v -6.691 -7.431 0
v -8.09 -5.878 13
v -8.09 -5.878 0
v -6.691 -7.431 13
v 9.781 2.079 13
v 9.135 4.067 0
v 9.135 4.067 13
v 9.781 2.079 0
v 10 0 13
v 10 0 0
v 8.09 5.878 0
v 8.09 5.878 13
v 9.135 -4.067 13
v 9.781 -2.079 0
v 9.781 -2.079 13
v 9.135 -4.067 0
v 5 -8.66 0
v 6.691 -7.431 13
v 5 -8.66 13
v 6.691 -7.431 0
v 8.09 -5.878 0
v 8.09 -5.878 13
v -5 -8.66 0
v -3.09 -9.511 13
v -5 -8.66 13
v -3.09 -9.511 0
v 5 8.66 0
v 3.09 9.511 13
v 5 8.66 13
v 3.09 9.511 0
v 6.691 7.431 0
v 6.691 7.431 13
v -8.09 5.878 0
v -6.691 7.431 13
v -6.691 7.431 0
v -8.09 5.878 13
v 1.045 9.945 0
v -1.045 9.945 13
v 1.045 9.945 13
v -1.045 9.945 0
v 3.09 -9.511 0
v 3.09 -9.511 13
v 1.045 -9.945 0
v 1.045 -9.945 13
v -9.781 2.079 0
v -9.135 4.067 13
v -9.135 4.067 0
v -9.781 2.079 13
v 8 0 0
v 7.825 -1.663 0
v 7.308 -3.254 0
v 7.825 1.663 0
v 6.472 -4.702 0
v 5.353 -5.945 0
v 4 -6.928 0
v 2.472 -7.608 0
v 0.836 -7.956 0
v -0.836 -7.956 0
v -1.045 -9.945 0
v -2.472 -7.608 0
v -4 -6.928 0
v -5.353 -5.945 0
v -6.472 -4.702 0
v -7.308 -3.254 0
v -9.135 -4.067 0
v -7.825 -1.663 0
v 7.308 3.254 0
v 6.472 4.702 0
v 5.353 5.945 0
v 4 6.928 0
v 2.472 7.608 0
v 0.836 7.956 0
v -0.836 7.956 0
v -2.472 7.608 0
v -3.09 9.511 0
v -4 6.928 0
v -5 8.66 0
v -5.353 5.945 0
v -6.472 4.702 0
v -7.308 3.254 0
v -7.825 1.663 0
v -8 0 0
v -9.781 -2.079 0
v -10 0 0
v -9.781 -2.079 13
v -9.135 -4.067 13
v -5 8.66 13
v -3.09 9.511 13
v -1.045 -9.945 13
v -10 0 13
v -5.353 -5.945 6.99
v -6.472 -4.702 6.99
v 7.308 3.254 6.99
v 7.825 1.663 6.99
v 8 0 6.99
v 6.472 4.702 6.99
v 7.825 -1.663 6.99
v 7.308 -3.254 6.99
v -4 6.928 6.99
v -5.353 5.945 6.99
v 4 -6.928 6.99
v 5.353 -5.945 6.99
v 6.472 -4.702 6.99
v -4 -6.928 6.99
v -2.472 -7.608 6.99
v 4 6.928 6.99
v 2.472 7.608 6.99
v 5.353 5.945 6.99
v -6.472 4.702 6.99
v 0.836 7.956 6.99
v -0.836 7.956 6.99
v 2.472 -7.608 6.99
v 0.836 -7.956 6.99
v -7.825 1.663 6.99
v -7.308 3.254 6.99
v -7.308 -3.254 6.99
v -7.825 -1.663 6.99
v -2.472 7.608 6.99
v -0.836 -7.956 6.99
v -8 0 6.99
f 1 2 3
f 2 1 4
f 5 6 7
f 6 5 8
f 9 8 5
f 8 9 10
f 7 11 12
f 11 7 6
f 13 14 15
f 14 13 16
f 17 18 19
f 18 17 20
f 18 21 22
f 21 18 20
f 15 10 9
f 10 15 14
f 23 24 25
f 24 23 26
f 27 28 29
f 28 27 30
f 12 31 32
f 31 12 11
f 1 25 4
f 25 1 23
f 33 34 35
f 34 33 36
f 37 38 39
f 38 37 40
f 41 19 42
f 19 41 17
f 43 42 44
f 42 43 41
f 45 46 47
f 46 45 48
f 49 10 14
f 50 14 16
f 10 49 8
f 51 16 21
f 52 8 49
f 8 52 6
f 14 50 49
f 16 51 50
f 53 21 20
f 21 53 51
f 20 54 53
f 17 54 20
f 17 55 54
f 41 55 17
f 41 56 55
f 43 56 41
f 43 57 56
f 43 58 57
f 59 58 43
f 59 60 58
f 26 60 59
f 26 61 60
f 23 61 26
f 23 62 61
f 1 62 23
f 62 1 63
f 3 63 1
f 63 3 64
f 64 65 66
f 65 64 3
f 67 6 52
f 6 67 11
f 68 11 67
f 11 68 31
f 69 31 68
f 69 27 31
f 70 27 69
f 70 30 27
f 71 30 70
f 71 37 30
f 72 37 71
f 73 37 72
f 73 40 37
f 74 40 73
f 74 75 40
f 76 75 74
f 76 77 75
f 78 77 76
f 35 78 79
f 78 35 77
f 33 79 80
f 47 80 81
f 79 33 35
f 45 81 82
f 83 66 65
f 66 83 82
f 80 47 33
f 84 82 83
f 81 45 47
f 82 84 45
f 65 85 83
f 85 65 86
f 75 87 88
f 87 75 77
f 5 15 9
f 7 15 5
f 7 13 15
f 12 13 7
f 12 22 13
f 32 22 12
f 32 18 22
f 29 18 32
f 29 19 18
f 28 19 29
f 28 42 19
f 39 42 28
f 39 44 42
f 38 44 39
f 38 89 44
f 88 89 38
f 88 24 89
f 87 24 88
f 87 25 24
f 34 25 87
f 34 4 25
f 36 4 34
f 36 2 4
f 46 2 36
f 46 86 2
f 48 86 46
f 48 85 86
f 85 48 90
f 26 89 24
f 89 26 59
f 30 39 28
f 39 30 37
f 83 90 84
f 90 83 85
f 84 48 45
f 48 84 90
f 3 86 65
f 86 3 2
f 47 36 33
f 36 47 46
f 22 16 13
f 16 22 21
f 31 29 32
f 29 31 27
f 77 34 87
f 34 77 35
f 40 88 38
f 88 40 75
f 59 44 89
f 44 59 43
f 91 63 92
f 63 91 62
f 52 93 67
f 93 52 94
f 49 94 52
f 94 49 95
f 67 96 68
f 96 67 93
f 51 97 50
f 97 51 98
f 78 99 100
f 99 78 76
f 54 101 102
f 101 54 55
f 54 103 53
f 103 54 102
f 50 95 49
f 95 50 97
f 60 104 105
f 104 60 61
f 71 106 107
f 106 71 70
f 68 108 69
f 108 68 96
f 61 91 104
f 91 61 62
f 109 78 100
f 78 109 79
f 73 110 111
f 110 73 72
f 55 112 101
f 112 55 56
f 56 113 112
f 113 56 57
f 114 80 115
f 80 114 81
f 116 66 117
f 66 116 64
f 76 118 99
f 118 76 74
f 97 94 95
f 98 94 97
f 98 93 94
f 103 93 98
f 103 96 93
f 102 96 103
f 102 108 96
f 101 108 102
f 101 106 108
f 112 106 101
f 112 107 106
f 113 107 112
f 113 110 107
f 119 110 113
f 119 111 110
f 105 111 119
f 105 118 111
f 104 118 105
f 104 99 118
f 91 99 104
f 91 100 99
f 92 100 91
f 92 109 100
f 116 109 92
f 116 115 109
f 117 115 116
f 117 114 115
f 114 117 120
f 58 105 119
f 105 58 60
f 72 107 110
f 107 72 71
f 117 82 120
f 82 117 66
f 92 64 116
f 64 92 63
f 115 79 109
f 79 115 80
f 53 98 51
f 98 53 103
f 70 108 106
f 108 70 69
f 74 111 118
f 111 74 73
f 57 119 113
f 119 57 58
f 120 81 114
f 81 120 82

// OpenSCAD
$fn=30;
difference(){
cylinder(r=10, 13);
translate([0,0,-.01])
cylinder(r=8, 7);
}
